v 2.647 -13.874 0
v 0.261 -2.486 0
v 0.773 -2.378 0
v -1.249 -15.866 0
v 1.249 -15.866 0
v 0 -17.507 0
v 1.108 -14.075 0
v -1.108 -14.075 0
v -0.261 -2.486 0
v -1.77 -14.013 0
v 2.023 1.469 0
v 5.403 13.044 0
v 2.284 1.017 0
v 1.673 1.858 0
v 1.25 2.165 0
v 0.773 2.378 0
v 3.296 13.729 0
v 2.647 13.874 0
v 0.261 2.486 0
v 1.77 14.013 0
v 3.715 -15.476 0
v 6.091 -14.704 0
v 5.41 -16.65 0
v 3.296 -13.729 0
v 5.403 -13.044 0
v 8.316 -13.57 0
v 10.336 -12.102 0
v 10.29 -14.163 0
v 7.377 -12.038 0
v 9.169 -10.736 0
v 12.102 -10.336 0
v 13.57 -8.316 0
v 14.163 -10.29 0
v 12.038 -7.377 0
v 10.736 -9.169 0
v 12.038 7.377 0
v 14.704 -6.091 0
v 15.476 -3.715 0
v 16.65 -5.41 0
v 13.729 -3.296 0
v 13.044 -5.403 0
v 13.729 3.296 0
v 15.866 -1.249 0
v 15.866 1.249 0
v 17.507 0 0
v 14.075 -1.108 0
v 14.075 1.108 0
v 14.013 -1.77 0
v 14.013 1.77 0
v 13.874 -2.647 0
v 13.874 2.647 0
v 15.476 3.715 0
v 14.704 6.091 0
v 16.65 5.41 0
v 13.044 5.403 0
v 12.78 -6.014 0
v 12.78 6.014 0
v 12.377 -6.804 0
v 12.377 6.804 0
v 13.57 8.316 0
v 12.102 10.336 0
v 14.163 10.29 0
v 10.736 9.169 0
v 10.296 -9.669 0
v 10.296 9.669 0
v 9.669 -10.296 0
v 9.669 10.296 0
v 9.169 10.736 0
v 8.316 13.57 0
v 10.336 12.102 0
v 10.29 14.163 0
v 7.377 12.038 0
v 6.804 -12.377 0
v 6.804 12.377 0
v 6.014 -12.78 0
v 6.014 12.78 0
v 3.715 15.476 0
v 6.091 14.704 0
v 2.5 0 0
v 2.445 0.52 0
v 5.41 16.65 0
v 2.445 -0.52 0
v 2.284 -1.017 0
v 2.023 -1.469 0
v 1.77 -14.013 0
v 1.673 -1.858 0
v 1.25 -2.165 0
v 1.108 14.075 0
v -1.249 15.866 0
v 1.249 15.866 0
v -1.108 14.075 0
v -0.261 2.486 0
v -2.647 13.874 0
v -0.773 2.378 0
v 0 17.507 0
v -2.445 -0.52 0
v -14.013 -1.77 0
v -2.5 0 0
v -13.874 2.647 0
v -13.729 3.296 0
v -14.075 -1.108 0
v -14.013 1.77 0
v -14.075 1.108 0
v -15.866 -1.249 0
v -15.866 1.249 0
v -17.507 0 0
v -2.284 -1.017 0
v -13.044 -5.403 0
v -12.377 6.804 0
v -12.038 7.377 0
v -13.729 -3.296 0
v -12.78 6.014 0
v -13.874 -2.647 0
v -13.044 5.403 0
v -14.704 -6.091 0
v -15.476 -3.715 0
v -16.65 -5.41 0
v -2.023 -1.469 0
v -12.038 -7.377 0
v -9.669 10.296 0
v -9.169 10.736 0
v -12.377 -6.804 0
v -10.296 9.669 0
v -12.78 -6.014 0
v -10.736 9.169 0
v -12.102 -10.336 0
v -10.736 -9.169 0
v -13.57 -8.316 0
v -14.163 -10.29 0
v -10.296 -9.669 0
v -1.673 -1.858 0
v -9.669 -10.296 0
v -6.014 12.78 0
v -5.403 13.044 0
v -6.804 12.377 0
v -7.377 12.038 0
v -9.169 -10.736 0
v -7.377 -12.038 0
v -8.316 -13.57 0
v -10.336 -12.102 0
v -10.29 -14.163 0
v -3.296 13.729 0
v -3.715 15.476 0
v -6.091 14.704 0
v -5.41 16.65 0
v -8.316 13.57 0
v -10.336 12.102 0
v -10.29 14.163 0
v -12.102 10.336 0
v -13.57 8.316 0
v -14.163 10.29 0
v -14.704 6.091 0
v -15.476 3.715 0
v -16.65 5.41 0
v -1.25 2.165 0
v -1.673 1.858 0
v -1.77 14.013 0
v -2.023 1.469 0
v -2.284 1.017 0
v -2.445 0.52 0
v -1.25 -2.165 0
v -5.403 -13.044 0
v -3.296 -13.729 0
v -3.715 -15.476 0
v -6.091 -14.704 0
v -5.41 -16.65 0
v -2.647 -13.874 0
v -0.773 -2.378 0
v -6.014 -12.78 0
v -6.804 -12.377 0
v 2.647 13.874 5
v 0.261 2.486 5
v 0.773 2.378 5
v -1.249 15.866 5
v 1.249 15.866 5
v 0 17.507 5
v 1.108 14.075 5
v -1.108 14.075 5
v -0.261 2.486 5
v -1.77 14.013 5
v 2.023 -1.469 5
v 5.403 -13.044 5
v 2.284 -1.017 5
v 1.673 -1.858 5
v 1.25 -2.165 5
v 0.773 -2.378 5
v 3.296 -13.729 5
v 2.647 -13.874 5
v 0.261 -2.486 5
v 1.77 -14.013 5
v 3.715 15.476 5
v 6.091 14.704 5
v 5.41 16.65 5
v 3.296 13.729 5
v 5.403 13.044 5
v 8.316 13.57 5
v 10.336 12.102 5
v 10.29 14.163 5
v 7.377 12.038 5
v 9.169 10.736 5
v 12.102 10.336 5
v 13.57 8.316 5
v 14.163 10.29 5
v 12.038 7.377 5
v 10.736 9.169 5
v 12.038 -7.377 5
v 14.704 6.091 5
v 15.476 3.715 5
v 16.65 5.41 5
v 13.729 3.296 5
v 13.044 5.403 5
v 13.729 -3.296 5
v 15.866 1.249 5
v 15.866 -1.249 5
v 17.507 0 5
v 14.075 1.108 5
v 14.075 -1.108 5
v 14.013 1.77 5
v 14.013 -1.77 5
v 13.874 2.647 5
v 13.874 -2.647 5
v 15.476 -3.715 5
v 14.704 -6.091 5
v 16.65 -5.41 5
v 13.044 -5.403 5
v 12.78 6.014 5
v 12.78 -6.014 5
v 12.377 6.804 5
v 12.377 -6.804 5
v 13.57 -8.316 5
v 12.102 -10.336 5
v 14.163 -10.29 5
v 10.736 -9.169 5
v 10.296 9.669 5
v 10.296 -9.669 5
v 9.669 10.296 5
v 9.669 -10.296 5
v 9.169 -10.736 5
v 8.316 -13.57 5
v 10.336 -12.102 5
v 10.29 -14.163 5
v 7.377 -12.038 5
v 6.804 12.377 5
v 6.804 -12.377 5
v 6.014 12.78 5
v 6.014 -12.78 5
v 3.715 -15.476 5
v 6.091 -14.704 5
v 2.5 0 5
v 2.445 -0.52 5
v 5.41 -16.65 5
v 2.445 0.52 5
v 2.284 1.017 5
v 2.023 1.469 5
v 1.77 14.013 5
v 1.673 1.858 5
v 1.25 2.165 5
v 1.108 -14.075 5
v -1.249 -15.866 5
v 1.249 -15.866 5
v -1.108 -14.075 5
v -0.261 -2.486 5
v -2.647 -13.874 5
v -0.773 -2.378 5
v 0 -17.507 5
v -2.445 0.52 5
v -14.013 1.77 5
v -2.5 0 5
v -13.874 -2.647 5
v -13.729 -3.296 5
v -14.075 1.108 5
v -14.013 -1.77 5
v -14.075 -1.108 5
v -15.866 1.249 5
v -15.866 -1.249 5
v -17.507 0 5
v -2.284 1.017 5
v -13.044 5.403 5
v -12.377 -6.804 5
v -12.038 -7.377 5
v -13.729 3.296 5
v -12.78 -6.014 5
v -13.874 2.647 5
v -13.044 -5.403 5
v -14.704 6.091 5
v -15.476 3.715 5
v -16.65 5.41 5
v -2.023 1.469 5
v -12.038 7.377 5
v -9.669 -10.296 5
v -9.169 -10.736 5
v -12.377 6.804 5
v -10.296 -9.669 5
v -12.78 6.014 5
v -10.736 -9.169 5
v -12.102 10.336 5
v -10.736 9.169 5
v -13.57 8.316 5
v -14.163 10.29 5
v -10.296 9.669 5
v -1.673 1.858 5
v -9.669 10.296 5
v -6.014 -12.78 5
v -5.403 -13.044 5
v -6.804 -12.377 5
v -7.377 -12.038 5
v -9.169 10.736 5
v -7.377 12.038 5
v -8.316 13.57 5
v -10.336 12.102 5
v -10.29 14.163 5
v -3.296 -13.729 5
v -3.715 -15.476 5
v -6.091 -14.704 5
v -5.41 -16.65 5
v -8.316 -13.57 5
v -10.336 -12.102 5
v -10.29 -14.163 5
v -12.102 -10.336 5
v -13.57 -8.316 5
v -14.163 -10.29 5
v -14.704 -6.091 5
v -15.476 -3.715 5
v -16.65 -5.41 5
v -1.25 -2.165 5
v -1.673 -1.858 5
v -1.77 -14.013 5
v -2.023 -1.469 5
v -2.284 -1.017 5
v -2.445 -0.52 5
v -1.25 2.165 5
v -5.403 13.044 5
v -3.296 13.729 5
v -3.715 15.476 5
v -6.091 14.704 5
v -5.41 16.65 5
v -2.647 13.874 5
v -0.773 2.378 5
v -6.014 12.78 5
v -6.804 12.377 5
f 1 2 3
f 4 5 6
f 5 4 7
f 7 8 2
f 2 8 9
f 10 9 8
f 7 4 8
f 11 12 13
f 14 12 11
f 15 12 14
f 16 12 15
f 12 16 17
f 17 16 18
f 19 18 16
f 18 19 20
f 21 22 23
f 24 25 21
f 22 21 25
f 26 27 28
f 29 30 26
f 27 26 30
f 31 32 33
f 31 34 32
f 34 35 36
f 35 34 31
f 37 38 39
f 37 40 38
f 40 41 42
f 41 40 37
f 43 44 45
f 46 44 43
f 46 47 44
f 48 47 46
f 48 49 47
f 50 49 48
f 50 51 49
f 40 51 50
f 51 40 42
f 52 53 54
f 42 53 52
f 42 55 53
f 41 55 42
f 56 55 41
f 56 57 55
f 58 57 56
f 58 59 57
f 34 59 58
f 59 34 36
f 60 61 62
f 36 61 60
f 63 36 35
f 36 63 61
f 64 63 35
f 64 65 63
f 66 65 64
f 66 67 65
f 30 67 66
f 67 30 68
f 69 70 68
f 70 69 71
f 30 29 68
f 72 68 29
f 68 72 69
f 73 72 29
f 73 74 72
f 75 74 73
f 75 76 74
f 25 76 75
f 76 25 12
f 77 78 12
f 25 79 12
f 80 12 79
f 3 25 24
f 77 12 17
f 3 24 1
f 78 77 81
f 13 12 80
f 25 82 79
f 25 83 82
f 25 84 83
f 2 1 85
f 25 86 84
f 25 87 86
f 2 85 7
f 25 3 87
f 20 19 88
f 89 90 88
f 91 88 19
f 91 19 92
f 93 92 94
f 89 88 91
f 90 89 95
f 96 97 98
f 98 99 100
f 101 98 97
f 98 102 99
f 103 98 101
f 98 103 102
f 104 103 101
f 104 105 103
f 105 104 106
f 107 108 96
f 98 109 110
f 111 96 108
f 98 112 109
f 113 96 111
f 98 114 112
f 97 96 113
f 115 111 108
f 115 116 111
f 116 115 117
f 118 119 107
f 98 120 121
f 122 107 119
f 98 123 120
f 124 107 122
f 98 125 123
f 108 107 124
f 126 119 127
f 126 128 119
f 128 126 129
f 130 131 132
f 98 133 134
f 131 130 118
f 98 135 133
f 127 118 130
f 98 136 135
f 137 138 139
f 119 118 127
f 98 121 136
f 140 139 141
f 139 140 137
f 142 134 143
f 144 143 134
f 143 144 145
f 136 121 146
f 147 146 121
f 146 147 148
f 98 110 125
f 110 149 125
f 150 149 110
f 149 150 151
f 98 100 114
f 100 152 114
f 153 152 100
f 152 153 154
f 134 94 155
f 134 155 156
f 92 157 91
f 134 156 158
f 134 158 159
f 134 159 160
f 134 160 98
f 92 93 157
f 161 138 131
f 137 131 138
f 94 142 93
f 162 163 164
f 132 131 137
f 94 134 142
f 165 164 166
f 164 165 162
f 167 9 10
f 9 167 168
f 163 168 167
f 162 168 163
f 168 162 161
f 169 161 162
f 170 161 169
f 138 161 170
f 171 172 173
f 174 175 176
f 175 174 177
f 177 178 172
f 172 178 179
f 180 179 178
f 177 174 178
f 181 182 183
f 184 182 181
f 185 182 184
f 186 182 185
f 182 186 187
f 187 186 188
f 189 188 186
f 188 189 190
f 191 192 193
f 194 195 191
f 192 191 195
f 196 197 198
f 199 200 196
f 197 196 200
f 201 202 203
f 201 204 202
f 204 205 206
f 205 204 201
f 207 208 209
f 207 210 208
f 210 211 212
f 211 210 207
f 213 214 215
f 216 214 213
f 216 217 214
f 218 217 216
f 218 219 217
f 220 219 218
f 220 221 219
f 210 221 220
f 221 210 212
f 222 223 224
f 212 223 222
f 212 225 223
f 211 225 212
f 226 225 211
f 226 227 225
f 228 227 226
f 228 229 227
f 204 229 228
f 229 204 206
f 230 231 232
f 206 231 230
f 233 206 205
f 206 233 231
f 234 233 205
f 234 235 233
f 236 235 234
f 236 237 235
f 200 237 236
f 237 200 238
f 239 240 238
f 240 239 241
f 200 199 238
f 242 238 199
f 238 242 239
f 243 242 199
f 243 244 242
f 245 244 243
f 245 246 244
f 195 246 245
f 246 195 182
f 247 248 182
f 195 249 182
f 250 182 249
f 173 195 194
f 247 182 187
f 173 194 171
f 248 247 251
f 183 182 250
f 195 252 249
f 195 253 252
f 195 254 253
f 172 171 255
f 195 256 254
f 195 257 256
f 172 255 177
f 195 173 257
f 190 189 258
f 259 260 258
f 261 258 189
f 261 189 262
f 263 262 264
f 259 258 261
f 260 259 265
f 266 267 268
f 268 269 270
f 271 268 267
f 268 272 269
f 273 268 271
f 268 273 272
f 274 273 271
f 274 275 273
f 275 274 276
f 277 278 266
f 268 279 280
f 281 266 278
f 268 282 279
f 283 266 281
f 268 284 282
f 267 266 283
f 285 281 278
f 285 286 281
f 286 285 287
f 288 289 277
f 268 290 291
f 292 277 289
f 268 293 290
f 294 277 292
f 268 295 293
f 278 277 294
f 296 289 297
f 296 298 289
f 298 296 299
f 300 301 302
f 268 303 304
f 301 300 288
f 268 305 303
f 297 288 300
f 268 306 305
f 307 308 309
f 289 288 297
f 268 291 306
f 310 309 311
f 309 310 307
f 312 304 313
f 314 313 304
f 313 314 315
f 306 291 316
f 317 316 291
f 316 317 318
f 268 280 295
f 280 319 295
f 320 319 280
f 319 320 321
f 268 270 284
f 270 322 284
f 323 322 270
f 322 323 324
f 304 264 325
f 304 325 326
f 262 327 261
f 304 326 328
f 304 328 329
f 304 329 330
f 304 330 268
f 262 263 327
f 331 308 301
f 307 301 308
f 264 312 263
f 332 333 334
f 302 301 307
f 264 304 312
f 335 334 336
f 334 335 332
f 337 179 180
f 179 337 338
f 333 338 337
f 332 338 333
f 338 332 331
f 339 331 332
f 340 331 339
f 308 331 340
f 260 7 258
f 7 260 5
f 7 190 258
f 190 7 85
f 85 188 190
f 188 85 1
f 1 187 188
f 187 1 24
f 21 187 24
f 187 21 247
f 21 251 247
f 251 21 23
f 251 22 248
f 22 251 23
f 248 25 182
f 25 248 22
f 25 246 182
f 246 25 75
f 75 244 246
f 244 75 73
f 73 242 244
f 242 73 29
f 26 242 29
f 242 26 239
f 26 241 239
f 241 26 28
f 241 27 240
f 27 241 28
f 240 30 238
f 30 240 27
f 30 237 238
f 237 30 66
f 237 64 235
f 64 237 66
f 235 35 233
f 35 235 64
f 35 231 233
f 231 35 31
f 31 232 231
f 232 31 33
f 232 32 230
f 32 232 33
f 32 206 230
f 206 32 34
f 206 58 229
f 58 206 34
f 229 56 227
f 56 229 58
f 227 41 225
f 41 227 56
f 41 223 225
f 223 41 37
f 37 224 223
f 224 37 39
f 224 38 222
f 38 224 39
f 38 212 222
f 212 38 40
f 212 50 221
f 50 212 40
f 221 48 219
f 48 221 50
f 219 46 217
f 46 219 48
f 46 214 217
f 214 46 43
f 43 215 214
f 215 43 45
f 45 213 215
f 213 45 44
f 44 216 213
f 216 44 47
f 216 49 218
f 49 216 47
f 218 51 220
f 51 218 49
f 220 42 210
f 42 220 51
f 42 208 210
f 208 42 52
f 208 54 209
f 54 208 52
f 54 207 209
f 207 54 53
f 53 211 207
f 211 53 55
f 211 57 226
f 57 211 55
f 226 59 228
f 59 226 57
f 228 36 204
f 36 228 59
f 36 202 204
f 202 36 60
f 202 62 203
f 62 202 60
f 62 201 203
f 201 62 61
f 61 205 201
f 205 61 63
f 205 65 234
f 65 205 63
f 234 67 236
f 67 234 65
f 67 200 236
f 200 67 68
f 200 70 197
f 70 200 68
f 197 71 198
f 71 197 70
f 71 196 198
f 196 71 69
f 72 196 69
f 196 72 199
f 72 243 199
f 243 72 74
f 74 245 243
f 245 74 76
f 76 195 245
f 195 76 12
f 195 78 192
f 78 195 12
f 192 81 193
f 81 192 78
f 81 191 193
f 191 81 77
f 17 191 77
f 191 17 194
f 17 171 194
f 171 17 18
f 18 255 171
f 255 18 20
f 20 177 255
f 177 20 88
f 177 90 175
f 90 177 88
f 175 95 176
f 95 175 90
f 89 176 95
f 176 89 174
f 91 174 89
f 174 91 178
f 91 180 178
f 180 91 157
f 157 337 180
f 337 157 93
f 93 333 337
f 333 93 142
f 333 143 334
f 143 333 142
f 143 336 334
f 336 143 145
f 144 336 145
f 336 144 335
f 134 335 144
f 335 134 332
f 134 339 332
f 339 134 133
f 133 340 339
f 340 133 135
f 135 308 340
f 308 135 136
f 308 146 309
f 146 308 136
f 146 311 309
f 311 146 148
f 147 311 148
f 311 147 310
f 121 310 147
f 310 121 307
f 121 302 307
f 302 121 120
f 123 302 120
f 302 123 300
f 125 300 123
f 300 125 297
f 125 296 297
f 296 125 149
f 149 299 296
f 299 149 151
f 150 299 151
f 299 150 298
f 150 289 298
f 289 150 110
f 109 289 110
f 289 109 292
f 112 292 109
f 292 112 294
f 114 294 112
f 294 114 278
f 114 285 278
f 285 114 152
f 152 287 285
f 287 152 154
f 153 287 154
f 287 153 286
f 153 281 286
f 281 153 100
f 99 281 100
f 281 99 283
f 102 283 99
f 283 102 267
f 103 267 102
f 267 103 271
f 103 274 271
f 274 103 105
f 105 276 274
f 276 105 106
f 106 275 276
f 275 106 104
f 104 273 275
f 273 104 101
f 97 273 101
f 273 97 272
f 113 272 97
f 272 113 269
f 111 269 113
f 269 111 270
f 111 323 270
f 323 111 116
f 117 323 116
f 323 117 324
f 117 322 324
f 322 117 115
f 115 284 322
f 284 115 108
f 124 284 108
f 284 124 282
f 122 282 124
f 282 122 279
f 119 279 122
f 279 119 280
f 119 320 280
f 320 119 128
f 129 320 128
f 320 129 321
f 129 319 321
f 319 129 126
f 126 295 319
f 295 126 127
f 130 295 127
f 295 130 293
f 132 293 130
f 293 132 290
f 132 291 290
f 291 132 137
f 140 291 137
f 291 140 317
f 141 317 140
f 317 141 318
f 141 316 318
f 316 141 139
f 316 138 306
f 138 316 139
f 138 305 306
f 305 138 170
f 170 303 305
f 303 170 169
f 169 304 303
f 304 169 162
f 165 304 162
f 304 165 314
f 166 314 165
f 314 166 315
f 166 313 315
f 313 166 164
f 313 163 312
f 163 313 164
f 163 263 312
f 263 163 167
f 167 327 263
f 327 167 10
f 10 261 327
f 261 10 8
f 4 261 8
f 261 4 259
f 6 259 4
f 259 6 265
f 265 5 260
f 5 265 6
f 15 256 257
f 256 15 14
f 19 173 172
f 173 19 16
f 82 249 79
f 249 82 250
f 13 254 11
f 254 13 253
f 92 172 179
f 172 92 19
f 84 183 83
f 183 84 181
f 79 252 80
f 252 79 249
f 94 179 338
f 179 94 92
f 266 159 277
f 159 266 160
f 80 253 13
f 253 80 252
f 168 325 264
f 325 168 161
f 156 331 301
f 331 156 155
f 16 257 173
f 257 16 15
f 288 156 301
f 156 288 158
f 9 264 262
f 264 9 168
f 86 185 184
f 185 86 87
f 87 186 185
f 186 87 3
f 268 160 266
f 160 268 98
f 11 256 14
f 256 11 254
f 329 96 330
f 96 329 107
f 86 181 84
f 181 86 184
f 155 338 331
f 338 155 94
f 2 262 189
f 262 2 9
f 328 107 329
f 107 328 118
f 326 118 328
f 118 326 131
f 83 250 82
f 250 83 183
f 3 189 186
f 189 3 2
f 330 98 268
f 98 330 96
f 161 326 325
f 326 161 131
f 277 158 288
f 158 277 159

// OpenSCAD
// Parametric Involute Gear
// Based on public domain OpenSCAD gear library

// Gear Parameters
number_of_teeth = 20;
circular_pitch = 5;      // Distance between teeth
pressure_angle = 20;     // Standard is 20 degrees
clearance = 0.2;
gear_thickness = 5;
rim_thickness = gear_thickness;
hub_thickness = gear_thickness;
hub_diameter = 10;
bore_diameter = 5;

// Calculations
pitch_radius = number_of_teeth * circular_pitch / (2 * PI);
base_radius = pitch_radius * cos(pressure_angle);
outer_radius = pitch_radius + circular_pitch / PI;
root_radius = pitch_radius - (circular_pitch / PI + clearance);

module gear_tooth() {
    angle = 360 / number_of_teeth;
    
    polygon([
        [0, 0],
        polar(root_radius, -angle/4),
        polar(pitch_radius, -angle/4),
        polar(outer_radius, 0),
        polar(pitch_radius, angle/4),
        polar(root_radius, angle/4),
    ]);
}

function polar(r, theta) = [r * cos(theta), r * sin(theta)];

module gear_2d() {
    difference() {
        union() {
            // Teeth
            for (i = [0:number_of_teeth-1]) {
                rotate([0, 0, i * 360 / number_of_teeth])
                    gear_tooth();
            }
            
            // Rim
            circle(r=root_radius, $fn=100);
        }
        
        // Hub hole
        circle(d=hub_diameter, $fn=50);
    }
}

module gear() {
    difference() {
        union() {
            // Main gear body
            linear_extrude(height=gear_thickness)
                gear_2d();
            
            // Hub
            cylinder(d=hub_diameter + 2, h=hub_thickness, $fn=50);
        }
        
        // Bore hole
        translate([0, 0, -1])
            cylinder(d=bore_diameter, h=hub_thickness + 2, $fn=30);
    }
}

// Generate the gear
gear();
